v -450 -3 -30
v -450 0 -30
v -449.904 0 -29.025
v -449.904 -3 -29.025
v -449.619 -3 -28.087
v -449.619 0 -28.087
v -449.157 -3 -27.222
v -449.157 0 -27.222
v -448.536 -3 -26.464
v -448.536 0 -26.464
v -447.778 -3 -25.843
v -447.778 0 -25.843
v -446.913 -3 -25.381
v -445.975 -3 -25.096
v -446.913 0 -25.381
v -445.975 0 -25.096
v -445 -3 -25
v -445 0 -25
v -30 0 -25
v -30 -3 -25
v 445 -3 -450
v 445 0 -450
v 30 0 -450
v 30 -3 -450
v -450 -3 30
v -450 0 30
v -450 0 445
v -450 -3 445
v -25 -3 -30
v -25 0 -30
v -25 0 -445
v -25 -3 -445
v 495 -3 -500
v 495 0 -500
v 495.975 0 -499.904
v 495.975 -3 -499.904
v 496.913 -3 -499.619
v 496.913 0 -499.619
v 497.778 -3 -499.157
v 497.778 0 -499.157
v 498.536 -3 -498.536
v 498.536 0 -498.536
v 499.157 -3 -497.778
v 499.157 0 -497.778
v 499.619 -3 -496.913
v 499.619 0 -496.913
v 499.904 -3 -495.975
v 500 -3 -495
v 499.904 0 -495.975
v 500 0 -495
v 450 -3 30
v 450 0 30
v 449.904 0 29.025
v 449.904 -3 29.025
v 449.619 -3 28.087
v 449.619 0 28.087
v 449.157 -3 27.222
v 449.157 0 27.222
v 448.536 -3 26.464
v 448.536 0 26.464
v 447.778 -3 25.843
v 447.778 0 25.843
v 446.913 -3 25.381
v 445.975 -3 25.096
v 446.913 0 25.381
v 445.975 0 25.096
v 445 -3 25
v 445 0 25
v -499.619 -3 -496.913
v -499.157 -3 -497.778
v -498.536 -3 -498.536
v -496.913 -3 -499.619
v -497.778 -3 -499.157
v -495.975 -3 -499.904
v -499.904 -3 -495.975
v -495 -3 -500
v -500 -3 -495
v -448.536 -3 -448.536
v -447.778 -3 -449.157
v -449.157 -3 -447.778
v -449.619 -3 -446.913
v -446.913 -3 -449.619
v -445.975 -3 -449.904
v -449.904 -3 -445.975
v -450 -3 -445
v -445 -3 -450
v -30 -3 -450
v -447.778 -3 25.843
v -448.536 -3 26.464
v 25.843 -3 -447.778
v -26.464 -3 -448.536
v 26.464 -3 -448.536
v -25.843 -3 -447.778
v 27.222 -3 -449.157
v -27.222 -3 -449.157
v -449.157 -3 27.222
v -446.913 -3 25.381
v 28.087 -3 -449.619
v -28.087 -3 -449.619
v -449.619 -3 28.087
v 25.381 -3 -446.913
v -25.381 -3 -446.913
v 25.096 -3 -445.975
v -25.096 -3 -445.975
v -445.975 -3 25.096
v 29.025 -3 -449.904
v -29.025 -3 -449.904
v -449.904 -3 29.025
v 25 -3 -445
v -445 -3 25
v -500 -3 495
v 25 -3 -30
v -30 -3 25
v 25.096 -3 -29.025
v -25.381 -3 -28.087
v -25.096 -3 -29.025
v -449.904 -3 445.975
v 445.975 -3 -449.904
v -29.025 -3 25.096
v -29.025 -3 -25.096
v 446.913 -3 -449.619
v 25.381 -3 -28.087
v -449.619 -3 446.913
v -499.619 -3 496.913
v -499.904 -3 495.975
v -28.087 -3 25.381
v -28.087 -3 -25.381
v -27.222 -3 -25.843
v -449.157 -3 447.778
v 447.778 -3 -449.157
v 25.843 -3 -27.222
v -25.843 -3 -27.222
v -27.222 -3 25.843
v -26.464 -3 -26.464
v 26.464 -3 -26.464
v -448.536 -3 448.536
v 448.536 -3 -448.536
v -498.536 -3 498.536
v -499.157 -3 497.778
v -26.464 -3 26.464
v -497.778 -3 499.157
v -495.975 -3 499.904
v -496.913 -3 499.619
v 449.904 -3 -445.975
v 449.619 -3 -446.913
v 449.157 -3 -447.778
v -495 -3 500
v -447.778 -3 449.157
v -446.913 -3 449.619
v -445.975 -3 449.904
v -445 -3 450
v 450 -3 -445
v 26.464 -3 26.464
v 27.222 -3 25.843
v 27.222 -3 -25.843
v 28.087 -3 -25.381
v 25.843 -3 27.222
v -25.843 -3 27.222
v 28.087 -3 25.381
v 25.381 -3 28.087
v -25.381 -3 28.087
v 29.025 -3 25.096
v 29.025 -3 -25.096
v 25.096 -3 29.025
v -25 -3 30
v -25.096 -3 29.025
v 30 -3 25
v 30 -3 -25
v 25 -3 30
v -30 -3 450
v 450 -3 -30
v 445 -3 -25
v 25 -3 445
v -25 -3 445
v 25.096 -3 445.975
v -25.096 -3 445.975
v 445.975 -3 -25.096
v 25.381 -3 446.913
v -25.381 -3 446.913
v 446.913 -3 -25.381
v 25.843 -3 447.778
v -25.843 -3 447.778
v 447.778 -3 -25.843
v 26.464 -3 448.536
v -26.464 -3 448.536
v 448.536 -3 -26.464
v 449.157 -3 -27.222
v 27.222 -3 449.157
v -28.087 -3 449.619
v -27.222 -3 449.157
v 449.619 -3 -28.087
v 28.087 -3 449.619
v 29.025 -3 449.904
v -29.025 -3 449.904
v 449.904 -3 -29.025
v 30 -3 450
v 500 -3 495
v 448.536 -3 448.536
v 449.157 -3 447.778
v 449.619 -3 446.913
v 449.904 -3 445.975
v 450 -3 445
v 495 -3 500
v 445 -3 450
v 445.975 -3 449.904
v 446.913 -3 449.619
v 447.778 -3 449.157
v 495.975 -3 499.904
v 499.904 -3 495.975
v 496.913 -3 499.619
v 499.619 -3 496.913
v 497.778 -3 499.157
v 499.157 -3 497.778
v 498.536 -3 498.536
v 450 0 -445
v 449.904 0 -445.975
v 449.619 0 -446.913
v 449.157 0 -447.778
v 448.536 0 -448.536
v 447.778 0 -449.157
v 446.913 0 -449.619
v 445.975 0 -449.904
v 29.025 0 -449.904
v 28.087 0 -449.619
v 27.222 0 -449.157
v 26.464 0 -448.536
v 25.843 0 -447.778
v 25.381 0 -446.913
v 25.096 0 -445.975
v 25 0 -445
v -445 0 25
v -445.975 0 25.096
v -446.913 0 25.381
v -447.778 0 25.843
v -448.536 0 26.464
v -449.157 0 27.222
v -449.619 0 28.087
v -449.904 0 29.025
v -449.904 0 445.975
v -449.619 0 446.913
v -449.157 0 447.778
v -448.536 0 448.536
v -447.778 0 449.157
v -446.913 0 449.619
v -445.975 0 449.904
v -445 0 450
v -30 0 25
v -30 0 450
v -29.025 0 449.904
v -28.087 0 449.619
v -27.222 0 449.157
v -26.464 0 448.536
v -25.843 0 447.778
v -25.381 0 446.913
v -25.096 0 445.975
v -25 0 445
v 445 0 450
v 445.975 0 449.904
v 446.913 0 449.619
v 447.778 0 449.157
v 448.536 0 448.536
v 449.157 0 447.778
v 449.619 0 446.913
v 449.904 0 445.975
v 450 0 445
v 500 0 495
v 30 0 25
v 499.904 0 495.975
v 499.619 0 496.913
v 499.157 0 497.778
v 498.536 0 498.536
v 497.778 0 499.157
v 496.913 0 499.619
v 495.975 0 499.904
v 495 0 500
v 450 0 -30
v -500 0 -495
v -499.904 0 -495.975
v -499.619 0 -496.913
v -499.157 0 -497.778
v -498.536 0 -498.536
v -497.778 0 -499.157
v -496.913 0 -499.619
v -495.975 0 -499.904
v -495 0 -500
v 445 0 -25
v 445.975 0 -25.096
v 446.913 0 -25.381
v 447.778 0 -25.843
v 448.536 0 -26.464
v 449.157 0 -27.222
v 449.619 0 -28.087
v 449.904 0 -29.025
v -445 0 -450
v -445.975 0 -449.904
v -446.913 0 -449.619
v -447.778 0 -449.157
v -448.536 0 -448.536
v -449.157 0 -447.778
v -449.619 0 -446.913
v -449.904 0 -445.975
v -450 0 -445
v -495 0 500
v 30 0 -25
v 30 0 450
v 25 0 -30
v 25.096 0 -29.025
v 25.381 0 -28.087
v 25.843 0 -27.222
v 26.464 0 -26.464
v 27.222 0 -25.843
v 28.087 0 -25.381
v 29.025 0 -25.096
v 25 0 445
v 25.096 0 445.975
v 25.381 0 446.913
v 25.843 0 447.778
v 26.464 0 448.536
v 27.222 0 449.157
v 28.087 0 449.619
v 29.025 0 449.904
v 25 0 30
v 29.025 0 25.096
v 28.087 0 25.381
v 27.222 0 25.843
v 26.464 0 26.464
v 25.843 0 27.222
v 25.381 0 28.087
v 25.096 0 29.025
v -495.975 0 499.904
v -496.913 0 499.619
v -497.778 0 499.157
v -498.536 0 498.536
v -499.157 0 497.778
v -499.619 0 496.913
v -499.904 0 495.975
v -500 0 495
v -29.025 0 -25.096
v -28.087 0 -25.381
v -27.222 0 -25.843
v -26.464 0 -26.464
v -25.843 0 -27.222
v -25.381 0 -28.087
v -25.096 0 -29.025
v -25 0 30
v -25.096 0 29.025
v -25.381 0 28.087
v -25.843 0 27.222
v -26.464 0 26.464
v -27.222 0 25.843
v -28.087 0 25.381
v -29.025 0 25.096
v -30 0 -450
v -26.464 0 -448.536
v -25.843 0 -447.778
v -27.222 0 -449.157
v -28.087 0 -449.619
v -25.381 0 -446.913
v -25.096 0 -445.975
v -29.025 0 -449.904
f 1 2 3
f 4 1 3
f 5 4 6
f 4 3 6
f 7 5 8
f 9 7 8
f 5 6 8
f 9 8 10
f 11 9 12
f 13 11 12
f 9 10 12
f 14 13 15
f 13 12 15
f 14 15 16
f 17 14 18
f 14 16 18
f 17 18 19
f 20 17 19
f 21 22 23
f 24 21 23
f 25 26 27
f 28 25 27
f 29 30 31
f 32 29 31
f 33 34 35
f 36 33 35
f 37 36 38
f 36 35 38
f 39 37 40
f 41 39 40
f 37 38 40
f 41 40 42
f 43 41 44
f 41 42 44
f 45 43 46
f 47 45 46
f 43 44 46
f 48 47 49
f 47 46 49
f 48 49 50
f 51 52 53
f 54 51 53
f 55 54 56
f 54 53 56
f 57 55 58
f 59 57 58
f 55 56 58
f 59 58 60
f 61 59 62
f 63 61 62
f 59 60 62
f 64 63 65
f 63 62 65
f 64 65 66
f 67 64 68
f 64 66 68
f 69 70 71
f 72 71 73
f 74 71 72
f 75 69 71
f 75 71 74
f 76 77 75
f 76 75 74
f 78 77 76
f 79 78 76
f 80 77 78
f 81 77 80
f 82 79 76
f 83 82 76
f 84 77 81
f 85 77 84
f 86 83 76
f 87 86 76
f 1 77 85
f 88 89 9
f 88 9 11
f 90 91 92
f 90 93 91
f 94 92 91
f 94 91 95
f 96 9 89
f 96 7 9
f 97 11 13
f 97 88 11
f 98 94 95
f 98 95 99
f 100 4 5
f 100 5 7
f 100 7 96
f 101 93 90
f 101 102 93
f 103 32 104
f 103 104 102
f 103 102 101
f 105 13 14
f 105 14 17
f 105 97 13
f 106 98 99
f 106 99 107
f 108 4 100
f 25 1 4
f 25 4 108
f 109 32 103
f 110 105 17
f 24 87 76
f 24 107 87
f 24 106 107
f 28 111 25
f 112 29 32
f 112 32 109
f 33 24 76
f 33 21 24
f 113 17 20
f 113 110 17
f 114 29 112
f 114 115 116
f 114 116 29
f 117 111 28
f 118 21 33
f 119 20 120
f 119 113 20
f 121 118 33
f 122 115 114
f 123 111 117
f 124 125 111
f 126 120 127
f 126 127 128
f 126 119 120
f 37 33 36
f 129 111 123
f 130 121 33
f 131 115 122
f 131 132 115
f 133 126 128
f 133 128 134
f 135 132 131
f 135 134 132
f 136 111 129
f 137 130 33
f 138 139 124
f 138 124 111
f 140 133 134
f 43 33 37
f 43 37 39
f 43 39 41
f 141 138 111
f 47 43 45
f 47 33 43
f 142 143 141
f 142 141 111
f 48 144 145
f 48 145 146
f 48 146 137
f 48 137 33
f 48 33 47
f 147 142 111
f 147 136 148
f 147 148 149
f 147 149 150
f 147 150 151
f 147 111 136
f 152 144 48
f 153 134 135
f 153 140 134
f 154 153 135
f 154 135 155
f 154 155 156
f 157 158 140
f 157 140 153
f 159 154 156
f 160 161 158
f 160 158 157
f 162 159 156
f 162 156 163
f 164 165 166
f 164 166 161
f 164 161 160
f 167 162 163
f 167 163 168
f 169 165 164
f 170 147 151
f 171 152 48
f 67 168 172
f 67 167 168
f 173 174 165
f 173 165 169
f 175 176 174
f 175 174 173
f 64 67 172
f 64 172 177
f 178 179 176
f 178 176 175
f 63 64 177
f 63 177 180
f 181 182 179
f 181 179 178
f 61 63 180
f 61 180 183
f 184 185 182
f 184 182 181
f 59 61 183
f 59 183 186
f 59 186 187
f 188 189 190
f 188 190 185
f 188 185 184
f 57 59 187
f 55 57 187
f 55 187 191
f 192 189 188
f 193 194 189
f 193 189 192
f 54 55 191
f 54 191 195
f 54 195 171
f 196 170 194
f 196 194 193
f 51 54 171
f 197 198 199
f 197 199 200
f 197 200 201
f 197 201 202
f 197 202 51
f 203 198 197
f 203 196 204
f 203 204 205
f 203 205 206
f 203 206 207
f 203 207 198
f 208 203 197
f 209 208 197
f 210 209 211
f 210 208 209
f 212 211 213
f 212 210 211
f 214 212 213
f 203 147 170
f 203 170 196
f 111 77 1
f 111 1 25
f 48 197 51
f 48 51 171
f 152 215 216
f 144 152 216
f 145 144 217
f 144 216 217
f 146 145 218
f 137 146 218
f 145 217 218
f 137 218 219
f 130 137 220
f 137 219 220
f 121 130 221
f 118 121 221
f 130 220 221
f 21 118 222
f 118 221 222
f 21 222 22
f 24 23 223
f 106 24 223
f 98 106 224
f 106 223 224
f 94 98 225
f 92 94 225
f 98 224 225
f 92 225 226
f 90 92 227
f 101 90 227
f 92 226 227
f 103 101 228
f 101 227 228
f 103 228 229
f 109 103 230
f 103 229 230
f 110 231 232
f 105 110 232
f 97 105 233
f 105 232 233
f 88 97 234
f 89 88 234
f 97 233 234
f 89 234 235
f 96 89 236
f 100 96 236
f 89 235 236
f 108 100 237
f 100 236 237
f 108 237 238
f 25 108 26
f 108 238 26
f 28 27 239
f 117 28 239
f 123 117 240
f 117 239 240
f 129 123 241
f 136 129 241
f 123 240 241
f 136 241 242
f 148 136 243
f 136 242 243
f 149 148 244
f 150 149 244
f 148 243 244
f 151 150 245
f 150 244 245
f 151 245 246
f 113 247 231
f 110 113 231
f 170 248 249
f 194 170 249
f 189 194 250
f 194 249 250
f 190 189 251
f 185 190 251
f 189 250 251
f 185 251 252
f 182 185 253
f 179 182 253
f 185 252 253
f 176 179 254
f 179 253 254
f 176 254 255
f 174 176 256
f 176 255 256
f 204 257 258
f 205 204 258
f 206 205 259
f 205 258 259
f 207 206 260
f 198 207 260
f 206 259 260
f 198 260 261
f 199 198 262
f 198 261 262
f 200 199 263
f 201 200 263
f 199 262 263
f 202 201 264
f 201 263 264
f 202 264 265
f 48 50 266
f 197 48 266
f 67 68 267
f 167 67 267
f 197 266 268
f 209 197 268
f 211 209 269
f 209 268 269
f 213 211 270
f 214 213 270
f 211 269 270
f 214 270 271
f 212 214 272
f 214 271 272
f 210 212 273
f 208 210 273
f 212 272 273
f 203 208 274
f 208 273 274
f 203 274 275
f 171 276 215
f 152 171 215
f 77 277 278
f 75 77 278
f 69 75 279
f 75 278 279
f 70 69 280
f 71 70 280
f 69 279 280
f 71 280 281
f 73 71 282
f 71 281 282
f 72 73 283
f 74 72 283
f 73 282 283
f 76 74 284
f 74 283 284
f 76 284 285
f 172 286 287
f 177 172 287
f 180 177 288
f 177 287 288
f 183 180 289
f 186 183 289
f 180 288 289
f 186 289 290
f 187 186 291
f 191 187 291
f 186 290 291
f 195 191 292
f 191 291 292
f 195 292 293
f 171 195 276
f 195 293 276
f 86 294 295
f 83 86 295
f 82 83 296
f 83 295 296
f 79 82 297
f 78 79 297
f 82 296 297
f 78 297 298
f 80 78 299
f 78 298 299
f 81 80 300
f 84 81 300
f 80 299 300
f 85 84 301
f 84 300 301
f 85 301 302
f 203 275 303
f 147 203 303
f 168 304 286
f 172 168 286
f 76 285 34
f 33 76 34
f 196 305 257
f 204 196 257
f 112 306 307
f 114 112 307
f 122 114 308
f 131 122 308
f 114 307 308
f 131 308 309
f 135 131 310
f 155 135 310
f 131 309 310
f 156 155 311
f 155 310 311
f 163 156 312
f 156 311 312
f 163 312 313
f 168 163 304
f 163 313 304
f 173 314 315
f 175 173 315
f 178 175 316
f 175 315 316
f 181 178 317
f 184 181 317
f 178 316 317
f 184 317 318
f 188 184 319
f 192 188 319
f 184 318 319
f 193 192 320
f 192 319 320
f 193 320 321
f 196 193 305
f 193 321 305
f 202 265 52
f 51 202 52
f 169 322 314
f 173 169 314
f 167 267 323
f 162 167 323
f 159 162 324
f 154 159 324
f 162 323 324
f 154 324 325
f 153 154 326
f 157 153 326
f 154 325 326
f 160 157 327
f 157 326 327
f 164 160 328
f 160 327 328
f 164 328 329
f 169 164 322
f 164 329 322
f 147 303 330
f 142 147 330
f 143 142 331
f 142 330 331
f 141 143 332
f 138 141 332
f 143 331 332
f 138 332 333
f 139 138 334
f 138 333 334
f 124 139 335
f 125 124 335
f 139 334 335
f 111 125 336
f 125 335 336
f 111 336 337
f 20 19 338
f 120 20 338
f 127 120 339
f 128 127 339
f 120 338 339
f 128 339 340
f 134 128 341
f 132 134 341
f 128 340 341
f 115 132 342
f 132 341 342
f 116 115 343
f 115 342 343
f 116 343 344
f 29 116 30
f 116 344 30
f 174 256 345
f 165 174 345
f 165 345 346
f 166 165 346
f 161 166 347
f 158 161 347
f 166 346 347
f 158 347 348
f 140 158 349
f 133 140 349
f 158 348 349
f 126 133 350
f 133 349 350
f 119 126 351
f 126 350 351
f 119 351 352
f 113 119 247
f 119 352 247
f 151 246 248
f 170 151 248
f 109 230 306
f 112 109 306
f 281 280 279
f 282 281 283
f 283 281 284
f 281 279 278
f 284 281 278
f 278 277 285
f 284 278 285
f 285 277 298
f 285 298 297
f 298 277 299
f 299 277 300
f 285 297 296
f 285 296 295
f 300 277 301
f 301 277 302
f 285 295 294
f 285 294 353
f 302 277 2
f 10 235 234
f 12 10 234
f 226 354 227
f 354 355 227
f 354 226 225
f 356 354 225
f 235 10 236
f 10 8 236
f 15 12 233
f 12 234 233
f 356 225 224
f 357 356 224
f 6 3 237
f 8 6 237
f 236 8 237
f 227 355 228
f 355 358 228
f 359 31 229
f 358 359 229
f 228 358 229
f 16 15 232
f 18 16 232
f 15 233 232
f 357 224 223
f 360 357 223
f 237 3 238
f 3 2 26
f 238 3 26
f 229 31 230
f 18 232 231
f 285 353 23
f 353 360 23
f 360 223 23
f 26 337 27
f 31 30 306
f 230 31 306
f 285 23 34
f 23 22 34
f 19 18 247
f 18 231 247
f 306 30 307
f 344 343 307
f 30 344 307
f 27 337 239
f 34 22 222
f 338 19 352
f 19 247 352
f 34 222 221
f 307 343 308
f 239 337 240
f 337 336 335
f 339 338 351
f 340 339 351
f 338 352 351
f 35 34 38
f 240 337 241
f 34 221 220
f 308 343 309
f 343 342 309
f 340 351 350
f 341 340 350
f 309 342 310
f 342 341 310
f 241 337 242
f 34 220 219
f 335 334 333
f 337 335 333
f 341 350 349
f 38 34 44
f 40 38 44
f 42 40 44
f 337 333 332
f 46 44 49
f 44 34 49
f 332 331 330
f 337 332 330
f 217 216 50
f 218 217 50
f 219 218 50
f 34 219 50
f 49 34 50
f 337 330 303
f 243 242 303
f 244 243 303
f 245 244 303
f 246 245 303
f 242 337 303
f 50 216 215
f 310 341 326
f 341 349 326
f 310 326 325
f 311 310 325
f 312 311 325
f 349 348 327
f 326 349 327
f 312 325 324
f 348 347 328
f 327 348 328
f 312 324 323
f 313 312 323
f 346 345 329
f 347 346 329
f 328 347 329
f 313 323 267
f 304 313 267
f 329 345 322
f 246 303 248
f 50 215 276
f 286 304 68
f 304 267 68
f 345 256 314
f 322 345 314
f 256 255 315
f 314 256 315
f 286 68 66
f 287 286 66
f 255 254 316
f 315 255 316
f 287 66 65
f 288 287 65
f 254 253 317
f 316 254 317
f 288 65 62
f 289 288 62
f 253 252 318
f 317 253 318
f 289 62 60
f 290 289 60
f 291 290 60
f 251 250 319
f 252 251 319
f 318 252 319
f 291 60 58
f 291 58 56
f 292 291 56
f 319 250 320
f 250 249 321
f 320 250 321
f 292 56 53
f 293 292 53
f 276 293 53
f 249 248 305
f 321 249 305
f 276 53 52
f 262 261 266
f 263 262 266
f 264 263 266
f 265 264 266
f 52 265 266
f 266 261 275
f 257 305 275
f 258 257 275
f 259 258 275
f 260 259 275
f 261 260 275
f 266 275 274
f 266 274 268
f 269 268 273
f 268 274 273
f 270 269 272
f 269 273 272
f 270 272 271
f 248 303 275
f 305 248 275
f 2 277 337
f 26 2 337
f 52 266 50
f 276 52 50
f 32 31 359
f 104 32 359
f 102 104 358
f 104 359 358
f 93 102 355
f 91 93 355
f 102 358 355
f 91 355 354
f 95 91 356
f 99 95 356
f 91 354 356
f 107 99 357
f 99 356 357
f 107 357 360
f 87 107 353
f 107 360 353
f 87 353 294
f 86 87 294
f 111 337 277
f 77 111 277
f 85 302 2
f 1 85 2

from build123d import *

# Parameters (mm, degrees)
F1_DEPTH = 3


with BuildPart() as f1:
    # F0 (on Front) → F1 (new body)
    with BuildSketch(Plane.XZ):
        with BuildLine():
            ThreePointArc((500, 495), (498.535534, 498.535534), (495, 500))
            Line((495, 500), (-495, 500))
            ThreePointArc((-495, 500), (-498.535534, 498.535534), (-500, 495))
            Line((-500, 495), (-500, -495))
            ThreePointArc((-500, -495), (-498.535534, -498.535534), (-495, -500))
            Line((-495, -500), (495, -500))
            ThreePointArc((495, -500), (498.535534, -498.535534), (500, -495))
            Line((500, -495), (500, 495))
        make_face()
        with BuildLine():
            ThreePointArc((-445, -450), (-448.535534, -448.535534), (-450, -445))
            Line((-450, -445), (-450, -30))
            ThreePointArc((-450, -30), (-448.535534, -26.464466), (-445, -25))
            Line((-445, -25), (-30, -25))
            ThreePointArc((-30, -25), (-26.464466, -26.464466), (-25, -30))
            Line((-25, -30), (-25, -445))
            ThreePointArc((-25, -445), (-26.464466, -448.535534), (-30, -450))
            Line((-30, -450), (-445, -450))
        make_face(mode=Mode.SUBTRACT)
        with BuildLine():
            ThreePointArc((30, -450), (26.464466, -448.535534), (25, -445))
            Line((25, -445), (25, -30))
            ThreePointArc((25, -30), (26.464466, -26.464466), (30, -25))
            Line((30, -25), (445, -25))
            ThreePointArc((445, -25), (448.535534, -26.464466), (450, -30))
            Line((450, -30), (450, -445))
            ThreePointArc((450, -445), (448.535534, -448.535534), (445, -450))
            Line((445, -450), (30, -450))
        make_face(mode=Mode.SUBTRACT)
        with BuildLine():
            ThreePointArc((-25, 30), (-26.464466, 26.464466), (-30, 25))
            Line((-30, 25), (-445, 25))
            ThreePointArc((-445, 25), (-448.535534, 26.464466), (-450, 30))
            Line((-450, 30), (-450, 445))
            ThreePointArc((-450, 445), (-448.535534, 448.535534), (-445, 450))
            Line((-445, 450), (-30, 450))
            ThreePointArc((-30, 450), (-26.464466, 448.535534), (-25, 445))
            Line((-25, 445), (-25, 30))
        make_face(mode=Mode.SUBTRACT)
        with BuildLine():
            ThreePointArc((30, 25), (26.464466, 26.464466), (25, 30))
            Line((25, 30), (25, 445))
            ThreePointArc((25, 445), (26.464466, 448.535534), (30, 450))
            Line((30, 450), (445, 450))
            ThreePointArc((445, 450), (448.535534, 448.535534), (450, 445))
            Line((450, 445), (450, 30))
            ThreePointArc((450, 30), (448.535534, 26.464466), (445, 25))
            Line((445, 25), (30, 25))
        make_face(mode=Mode.SUBTRACT)
    extrude(amount=F1_DEPTH)


solid = f1.part
